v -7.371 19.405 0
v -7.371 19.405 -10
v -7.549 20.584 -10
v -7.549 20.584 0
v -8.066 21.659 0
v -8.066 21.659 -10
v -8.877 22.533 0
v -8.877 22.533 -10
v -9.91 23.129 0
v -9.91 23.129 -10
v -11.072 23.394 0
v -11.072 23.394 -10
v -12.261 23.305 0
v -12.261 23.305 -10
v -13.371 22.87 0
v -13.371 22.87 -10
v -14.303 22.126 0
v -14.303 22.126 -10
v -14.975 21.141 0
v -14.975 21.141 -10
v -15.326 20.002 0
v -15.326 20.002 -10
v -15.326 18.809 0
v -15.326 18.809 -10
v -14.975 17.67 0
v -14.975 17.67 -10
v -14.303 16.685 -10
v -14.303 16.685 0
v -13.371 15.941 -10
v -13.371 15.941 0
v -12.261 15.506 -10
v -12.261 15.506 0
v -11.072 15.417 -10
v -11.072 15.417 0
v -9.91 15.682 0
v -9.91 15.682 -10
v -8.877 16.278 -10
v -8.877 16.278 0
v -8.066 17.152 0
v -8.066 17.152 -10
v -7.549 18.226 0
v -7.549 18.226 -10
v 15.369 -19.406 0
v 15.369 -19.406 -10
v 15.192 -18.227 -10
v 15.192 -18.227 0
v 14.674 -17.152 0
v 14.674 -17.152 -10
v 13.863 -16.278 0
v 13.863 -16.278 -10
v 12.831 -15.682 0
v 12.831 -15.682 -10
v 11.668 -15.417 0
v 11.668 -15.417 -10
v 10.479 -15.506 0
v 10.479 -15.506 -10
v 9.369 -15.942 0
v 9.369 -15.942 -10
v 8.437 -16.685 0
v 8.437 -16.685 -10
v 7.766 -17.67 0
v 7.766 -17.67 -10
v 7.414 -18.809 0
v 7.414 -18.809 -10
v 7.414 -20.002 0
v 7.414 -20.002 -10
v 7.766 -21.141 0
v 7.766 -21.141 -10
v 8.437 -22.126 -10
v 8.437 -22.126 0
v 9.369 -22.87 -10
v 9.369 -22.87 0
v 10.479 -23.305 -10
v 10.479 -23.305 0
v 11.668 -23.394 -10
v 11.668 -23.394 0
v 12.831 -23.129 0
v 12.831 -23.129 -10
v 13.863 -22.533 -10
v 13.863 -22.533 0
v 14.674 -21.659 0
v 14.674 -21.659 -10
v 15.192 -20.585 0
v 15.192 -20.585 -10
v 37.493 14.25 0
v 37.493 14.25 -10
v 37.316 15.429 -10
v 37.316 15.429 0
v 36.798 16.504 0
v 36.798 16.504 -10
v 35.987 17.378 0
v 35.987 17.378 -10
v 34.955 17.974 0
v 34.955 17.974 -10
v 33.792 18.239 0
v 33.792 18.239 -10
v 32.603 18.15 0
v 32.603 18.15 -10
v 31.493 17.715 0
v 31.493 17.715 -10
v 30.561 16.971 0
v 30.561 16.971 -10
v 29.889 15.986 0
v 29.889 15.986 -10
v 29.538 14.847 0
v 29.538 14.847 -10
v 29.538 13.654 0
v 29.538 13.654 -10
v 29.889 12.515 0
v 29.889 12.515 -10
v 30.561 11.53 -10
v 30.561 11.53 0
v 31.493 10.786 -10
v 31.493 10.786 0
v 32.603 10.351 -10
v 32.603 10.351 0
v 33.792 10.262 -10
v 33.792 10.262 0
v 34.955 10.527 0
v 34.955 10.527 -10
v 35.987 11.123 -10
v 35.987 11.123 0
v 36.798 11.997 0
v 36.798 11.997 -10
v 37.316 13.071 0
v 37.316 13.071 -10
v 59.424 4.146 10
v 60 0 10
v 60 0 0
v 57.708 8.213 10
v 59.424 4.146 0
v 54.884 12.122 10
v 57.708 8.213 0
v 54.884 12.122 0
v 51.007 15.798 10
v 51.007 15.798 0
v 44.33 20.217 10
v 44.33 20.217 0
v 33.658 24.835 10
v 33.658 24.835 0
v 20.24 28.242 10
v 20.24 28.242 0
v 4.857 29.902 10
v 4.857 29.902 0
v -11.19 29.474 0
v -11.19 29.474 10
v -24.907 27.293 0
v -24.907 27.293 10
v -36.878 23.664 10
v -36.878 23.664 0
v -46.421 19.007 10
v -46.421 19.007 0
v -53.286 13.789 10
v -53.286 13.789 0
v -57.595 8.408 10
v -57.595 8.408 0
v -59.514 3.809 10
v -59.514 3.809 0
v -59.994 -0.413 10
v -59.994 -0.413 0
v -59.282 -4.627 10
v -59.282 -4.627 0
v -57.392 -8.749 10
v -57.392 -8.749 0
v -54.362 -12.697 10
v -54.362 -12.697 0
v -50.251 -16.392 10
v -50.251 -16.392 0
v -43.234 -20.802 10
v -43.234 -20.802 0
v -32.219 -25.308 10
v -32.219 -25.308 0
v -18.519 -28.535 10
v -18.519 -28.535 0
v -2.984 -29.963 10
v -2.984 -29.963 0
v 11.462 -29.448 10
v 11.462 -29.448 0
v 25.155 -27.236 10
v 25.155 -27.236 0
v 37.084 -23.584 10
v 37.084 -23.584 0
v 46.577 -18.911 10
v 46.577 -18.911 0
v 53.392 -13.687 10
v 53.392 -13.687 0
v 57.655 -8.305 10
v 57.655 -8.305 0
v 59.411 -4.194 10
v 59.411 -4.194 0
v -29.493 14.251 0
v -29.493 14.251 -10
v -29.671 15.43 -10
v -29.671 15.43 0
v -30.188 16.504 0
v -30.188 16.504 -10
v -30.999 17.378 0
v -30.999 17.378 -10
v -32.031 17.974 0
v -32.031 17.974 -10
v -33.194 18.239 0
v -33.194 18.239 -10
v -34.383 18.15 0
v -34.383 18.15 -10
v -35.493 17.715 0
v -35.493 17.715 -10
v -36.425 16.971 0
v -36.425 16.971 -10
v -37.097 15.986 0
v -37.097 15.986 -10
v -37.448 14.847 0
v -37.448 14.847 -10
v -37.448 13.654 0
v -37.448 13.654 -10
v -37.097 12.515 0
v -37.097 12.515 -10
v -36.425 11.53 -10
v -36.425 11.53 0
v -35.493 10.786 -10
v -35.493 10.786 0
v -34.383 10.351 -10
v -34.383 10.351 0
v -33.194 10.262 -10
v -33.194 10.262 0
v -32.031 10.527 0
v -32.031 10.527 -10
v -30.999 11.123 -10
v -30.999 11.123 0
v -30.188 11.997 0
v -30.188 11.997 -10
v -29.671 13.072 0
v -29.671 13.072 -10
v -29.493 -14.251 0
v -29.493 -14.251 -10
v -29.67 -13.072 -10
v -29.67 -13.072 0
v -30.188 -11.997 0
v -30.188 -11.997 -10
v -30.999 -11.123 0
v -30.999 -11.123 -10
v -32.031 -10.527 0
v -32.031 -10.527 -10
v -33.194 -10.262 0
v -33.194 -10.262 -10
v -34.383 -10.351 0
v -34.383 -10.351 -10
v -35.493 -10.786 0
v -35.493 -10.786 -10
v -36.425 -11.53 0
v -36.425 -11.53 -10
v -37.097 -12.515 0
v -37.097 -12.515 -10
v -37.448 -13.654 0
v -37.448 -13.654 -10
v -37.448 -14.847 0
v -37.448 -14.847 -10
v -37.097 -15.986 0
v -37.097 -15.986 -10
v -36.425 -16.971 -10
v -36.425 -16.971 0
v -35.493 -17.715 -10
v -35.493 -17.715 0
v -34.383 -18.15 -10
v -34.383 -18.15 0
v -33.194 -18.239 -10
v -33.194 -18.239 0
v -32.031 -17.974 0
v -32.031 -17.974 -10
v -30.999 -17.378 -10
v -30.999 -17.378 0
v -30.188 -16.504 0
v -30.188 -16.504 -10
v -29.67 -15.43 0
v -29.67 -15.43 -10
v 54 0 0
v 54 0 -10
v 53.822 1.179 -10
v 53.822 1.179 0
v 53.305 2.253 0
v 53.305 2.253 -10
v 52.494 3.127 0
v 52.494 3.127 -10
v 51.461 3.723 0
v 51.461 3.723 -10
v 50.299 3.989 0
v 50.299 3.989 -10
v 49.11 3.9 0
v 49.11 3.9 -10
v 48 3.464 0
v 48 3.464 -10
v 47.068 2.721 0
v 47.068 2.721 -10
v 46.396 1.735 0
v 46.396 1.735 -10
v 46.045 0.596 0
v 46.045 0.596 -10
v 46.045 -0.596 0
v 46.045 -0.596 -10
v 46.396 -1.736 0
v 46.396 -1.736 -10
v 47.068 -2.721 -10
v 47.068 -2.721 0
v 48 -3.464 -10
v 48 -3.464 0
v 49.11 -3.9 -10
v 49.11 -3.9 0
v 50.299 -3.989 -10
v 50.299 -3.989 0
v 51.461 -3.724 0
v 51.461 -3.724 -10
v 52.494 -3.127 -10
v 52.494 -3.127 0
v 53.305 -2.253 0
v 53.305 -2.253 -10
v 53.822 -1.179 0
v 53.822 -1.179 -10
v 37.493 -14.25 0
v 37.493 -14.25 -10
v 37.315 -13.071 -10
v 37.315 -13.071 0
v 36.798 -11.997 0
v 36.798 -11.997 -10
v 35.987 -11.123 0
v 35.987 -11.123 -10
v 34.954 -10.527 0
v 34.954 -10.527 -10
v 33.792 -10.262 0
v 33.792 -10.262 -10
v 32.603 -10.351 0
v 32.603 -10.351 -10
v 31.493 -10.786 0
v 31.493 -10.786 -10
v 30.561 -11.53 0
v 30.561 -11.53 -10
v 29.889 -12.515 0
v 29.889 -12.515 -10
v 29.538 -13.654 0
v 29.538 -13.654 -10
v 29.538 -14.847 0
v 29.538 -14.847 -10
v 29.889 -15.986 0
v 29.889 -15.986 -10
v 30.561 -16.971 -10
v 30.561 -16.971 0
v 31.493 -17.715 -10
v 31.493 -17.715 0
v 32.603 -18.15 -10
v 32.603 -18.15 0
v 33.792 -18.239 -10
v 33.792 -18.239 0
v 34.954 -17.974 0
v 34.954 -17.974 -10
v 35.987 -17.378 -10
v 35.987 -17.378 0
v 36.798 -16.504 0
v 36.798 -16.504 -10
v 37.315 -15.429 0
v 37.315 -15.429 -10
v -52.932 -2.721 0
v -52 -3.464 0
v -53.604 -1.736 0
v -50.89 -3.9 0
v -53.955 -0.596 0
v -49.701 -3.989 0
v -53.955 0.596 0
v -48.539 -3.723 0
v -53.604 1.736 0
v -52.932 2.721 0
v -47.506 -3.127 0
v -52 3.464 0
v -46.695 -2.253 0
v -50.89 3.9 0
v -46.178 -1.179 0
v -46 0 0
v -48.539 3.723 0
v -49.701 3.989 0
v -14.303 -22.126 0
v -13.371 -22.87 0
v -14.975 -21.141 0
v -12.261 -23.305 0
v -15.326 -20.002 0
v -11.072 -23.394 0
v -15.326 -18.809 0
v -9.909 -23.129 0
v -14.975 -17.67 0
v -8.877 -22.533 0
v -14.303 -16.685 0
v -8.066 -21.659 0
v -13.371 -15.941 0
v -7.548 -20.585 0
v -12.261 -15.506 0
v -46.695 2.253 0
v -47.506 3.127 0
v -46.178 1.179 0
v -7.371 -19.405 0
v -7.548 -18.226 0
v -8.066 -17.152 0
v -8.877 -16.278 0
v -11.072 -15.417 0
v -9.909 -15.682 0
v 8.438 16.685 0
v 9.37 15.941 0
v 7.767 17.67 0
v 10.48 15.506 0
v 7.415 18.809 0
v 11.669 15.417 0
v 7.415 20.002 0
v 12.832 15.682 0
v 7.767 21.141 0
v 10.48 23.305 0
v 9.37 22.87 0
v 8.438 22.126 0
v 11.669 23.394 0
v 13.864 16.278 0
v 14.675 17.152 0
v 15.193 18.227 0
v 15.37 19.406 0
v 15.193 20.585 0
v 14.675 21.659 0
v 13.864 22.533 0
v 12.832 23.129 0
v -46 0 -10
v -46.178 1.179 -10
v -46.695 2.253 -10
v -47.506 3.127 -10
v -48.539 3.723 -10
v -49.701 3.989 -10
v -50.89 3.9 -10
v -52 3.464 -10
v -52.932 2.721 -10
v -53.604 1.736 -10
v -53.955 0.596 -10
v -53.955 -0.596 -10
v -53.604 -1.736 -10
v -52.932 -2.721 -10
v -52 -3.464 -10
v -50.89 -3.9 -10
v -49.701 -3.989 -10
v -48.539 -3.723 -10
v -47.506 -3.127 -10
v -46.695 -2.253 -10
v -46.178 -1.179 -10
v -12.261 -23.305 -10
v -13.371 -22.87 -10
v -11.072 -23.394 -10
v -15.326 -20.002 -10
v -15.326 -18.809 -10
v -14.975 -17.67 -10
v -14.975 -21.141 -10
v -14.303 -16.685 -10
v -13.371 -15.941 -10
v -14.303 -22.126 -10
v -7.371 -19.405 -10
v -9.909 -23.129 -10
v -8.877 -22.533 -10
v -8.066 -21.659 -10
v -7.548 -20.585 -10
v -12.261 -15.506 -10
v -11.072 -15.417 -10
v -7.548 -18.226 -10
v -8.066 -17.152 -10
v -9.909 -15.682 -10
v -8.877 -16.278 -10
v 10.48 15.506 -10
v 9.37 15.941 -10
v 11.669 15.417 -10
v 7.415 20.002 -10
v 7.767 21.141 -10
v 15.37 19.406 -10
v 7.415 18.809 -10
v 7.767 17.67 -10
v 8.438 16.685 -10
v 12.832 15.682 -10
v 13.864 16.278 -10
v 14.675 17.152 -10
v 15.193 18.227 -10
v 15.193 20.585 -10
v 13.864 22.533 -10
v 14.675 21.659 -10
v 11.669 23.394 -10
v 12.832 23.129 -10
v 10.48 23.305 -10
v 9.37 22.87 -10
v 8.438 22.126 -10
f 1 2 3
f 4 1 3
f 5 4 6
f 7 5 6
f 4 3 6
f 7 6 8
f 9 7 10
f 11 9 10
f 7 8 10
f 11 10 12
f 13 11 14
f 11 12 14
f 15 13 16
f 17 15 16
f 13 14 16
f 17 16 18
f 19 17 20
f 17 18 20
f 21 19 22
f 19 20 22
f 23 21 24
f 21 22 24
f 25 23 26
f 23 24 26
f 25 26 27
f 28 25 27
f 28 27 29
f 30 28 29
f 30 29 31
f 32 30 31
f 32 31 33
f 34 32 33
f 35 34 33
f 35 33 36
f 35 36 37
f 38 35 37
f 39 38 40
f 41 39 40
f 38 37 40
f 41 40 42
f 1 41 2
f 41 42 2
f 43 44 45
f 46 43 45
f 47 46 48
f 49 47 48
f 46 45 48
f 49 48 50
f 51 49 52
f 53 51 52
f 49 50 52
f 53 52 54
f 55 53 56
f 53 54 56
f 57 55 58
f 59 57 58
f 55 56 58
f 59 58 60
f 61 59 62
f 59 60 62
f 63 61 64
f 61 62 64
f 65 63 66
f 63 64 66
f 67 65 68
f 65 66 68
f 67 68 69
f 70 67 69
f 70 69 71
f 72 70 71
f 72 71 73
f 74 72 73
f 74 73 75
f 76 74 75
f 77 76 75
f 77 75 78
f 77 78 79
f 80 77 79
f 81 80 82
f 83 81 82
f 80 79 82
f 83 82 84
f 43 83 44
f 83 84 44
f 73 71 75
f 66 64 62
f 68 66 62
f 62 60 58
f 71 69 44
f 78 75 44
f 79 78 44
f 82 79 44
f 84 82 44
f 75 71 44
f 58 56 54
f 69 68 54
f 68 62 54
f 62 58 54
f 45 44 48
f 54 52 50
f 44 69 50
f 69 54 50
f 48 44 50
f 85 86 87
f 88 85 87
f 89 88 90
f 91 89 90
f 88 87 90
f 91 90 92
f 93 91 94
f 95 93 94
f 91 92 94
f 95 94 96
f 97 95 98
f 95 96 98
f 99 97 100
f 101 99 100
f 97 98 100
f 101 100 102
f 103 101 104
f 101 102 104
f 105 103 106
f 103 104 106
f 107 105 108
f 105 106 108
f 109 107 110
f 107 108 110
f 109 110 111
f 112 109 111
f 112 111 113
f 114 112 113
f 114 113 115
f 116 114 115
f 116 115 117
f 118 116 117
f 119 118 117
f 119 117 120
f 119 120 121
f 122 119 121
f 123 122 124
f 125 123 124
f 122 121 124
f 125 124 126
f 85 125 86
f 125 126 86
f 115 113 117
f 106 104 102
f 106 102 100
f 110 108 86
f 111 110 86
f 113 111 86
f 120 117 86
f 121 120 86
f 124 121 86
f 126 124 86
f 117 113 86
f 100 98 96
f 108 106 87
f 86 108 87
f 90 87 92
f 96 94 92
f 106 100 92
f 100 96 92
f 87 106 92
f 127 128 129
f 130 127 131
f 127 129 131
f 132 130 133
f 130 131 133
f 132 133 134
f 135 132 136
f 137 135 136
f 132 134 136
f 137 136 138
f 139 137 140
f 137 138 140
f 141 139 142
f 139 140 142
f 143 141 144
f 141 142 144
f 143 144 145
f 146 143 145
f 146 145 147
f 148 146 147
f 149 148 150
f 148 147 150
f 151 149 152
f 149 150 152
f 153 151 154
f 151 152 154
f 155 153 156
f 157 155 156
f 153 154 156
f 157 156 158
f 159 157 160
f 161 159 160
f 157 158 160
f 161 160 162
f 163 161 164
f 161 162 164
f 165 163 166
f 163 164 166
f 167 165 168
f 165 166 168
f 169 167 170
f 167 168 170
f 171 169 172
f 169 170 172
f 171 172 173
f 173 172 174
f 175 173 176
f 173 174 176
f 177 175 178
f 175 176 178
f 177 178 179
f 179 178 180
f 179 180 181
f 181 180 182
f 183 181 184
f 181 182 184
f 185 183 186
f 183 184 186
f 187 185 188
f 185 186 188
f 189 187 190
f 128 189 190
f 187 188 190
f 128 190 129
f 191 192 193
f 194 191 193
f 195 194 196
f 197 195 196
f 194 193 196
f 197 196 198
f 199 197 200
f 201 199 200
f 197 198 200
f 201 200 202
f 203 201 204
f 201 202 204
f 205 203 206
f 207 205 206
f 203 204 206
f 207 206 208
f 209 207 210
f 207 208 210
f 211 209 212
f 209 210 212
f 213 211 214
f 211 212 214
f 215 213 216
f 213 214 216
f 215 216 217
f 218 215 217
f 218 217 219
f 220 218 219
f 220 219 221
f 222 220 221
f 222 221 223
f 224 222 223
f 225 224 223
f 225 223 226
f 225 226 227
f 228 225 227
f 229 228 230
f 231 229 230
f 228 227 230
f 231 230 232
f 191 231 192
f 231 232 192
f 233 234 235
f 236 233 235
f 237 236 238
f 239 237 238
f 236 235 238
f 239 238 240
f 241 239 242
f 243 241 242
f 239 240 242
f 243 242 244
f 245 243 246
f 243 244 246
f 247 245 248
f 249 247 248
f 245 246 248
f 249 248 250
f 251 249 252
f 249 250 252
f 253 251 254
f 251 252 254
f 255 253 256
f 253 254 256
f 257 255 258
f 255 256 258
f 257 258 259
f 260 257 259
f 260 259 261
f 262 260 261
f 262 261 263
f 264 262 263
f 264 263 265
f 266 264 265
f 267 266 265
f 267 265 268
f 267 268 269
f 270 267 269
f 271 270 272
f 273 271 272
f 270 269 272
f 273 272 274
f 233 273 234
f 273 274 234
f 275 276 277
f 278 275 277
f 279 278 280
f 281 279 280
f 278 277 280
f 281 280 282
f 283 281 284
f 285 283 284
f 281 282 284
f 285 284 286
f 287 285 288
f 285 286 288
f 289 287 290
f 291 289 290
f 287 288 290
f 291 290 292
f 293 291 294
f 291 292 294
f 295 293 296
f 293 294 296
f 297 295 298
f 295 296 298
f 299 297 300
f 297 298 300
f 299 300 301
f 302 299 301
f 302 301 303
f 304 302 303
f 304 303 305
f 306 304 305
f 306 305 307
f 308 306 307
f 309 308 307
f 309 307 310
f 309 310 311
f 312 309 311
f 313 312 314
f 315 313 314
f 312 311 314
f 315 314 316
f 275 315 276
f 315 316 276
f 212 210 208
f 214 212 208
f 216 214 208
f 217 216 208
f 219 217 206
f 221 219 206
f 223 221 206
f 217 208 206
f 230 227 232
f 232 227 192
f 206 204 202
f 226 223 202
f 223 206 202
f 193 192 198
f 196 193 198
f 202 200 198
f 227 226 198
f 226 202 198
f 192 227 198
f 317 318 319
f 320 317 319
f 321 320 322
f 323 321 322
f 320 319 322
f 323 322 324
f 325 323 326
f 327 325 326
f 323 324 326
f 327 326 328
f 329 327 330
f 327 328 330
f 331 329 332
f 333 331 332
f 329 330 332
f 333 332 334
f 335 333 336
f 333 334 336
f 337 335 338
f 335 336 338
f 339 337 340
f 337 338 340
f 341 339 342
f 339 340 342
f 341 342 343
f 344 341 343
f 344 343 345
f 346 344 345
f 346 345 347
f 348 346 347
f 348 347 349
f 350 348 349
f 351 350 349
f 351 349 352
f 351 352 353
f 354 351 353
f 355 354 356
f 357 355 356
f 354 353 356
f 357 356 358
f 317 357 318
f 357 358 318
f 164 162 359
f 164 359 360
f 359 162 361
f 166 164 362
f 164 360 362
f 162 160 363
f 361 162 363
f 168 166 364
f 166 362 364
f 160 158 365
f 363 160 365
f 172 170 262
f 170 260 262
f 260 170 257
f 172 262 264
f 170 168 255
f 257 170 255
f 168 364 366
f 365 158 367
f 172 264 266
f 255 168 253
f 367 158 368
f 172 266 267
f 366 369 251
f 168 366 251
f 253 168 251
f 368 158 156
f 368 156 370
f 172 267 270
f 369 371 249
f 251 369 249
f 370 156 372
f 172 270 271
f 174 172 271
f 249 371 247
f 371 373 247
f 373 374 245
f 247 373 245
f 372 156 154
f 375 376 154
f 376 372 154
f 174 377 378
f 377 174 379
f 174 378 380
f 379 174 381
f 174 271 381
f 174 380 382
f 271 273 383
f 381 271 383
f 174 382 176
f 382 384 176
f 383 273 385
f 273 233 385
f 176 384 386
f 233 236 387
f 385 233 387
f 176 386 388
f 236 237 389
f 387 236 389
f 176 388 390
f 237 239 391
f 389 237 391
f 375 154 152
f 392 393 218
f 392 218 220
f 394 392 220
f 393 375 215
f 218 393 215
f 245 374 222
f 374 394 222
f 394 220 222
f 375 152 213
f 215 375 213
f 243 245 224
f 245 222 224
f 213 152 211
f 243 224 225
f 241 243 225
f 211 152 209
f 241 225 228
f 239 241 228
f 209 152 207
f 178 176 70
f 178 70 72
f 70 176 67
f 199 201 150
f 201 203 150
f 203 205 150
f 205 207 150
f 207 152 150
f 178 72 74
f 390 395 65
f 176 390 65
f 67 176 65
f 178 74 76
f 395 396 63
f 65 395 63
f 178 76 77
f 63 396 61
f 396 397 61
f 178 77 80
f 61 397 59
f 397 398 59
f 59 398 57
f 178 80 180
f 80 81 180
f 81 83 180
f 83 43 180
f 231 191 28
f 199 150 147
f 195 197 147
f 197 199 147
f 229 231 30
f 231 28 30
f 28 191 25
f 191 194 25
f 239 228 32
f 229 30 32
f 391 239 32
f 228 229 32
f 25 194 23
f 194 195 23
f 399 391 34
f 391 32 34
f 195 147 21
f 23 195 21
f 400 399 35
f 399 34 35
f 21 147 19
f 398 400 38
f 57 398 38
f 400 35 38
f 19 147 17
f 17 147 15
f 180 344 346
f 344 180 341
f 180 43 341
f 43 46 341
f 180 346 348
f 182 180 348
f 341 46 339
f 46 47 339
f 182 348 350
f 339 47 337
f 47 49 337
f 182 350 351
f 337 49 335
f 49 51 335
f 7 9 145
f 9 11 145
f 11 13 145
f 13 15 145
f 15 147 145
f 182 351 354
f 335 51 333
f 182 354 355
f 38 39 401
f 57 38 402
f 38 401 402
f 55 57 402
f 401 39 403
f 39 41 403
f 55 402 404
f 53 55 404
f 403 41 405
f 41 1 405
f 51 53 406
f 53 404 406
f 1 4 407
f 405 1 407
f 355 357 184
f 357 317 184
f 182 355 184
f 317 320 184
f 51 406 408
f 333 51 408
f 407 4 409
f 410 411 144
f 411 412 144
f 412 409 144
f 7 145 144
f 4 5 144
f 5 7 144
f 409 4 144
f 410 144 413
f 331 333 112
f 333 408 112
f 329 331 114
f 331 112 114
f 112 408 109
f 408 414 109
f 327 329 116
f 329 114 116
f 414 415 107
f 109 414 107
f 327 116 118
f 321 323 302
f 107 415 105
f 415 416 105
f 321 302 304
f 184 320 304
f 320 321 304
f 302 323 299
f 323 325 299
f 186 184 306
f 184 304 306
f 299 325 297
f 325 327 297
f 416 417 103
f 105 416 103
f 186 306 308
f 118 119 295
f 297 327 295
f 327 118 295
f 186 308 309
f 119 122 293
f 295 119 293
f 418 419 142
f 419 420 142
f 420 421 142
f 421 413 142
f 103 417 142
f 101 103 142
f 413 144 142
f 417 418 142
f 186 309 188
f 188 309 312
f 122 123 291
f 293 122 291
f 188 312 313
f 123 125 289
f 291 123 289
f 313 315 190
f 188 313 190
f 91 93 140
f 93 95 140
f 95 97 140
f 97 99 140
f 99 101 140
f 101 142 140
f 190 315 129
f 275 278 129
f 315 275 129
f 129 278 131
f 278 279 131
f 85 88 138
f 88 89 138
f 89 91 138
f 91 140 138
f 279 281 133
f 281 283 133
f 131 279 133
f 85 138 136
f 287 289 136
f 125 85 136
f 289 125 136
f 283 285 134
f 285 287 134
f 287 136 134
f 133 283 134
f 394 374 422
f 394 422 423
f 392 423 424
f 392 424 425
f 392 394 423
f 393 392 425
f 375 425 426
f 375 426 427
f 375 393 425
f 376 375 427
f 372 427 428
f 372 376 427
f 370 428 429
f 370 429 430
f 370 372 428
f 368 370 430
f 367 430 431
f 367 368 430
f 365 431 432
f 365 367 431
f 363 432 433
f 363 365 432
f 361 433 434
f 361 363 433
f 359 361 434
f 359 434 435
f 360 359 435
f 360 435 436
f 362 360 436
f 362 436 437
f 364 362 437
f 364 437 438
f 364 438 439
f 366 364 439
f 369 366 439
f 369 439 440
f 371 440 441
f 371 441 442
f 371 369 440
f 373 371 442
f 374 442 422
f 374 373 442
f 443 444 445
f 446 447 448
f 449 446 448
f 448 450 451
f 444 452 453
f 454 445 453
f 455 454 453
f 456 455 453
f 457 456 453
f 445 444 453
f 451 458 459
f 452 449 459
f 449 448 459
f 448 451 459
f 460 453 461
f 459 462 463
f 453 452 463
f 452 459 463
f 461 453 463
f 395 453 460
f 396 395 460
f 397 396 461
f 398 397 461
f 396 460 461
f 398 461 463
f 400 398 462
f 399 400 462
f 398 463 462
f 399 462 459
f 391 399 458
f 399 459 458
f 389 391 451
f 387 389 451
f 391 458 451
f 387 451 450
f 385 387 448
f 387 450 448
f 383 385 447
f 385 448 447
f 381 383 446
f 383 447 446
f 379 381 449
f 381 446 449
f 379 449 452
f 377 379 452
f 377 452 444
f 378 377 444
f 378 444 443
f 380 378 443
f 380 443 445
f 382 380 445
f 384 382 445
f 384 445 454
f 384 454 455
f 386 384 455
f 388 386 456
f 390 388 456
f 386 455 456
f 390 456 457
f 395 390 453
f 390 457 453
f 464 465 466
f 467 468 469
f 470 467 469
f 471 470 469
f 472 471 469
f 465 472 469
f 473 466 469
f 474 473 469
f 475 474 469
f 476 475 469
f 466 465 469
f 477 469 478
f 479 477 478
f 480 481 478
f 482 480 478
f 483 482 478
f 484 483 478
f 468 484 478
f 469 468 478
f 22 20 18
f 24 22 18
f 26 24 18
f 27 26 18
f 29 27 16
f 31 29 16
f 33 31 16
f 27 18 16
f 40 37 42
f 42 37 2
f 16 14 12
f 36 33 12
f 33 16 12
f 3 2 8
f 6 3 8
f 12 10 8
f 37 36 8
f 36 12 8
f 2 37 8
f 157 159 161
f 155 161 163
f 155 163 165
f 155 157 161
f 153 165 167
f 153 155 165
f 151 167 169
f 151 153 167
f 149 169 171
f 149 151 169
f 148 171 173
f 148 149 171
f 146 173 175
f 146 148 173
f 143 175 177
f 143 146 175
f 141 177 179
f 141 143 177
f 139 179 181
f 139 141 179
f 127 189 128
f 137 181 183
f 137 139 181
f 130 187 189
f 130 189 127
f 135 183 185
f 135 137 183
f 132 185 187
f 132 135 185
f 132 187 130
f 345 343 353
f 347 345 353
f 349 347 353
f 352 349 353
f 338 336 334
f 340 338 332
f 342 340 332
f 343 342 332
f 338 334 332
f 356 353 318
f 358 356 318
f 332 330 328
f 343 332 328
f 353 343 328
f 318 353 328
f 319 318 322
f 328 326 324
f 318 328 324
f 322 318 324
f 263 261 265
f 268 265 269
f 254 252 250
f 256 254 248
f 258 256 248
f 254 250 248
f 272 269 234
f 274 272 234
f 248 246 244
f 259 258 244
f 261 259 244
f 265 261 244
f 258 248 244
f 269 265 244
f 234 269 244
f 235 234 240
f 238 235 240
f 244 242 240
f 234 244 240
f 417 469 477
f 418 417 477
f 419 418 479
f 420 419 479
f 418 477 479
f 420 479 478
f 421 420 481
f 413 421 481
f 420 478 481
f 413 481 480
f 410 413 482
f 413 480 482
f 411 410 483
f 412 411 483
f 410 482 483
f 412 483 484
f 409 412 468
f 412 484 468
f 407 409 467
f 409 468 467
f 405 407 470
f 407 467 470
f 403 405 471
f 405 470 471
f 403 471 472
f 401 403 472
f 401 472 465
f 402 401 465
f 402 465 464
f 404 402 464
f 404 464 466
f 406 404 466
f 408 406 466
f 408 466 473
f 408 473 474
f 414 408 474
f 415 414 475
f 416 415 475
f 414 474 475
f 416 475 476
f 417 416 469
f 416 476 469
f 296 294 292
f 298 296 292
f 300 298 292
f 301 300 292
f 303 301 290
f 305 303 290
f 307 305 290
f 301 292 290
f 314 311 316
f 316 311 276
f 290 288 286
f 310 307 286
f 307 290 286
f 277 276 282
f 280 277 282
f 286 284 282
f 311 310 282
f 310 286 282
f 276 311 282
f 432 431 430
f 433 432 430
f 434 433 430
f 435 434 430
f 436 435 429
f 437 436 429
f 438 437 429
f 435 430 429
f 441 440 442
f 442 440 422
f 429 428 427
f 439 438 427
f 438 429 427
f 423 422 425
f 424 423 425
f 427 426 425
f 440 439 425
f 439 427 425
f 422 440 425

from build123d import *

# Parameters (mm, degrees)
SKICA1_RX               = 60
SKICA1_RY               = 30
SKICA1_R                = 4
P_IDAT_VYSUNUT_M1_DEPTH = 10
SKICA1_4_R              = 4
P_IDAT_VYSUNUT_M3_DEPTH = 10
CRVPATTERN1_START       = -10
CRVPATTERN1_OUTLINE_R   = 4
CRVPATTERN1_DEPTH       = 10


# Read off the part's stored shape, not the designer's step: CrvPattern1
with BuildPart() as part:
    # Skica1 → Přidat vysunutím1 (new body)
    # profile 1 of 2: a face of its own
    with BuildSketch(Plane.XY):
        with Locations((0, 0)):
            Ellipse(SKICA1_RX, SKICA1_RY)
        with Locations((-50, 0)):
            Circle(SKICA1_R, mode=Mode.SUBTRACT)
    # profile 2 of 2: a face of its own
    with BuildSketch(Plane.XY):
        with Locations((-50, 0)):
            Circle(SKICA1_R)
    extrude(amount=P_IDAT_VYSUNUT_M1_DEPTH)

    # Skica1<4> → Přidat vysunutím3 (add)
    with BuildSketch(Plane.XY):
        with Locations((-50, 0)):
            Circle(SKICA1_4_R)
    extrude(amount=-P_IDAT_VYSUNUT_M3_DEPTH)

    # CrvPattern1 outline → CrvPattern1 (add)
    with BuildSketch(Plane.XY.offset(CRVPATTERN1_START)):
        with Locations((-33.492839023, 14.250541881)):
            Circle(CRVPATTERN1_OUTLINE_R)
        with Locations((-11.370922058, 19.405478737)):
            Circle(CRVPATTERN1_OUTLINE_R)
        with Locations((11.370433267, 19.405524946)):
            Circle(CRVPATTERN1_OUTLINE_R)
        with Locations((33.493372943, 14.250403108)):
            Circle(CRVPATTERN1_OUTLINE_R)
        with Locations((49.999827835, -8.0151e-05)):
            Circle(CRVPATTERN1_OUTLINE_R)
        with Locations((33.493062429, -14.250407673)):
            Circle(CRVPATTERN1_OUTLINE_R)
        with Locations((11.369477866, -19.405634054)):
            Circle(CRVPATTERN1_OUTLINE_R)
        with Locations((-11.370751059, -19.405496472)):
            Circle(CRVPATTERN1_OUTLINE_R)
        with Locations((-33.492737691, -14.250555974)):
            Circle(CRVPATTERN1_OUTLINE_R)
    extrude(amount=CRVPATTERN1_DEPTH)


solid = part.part
